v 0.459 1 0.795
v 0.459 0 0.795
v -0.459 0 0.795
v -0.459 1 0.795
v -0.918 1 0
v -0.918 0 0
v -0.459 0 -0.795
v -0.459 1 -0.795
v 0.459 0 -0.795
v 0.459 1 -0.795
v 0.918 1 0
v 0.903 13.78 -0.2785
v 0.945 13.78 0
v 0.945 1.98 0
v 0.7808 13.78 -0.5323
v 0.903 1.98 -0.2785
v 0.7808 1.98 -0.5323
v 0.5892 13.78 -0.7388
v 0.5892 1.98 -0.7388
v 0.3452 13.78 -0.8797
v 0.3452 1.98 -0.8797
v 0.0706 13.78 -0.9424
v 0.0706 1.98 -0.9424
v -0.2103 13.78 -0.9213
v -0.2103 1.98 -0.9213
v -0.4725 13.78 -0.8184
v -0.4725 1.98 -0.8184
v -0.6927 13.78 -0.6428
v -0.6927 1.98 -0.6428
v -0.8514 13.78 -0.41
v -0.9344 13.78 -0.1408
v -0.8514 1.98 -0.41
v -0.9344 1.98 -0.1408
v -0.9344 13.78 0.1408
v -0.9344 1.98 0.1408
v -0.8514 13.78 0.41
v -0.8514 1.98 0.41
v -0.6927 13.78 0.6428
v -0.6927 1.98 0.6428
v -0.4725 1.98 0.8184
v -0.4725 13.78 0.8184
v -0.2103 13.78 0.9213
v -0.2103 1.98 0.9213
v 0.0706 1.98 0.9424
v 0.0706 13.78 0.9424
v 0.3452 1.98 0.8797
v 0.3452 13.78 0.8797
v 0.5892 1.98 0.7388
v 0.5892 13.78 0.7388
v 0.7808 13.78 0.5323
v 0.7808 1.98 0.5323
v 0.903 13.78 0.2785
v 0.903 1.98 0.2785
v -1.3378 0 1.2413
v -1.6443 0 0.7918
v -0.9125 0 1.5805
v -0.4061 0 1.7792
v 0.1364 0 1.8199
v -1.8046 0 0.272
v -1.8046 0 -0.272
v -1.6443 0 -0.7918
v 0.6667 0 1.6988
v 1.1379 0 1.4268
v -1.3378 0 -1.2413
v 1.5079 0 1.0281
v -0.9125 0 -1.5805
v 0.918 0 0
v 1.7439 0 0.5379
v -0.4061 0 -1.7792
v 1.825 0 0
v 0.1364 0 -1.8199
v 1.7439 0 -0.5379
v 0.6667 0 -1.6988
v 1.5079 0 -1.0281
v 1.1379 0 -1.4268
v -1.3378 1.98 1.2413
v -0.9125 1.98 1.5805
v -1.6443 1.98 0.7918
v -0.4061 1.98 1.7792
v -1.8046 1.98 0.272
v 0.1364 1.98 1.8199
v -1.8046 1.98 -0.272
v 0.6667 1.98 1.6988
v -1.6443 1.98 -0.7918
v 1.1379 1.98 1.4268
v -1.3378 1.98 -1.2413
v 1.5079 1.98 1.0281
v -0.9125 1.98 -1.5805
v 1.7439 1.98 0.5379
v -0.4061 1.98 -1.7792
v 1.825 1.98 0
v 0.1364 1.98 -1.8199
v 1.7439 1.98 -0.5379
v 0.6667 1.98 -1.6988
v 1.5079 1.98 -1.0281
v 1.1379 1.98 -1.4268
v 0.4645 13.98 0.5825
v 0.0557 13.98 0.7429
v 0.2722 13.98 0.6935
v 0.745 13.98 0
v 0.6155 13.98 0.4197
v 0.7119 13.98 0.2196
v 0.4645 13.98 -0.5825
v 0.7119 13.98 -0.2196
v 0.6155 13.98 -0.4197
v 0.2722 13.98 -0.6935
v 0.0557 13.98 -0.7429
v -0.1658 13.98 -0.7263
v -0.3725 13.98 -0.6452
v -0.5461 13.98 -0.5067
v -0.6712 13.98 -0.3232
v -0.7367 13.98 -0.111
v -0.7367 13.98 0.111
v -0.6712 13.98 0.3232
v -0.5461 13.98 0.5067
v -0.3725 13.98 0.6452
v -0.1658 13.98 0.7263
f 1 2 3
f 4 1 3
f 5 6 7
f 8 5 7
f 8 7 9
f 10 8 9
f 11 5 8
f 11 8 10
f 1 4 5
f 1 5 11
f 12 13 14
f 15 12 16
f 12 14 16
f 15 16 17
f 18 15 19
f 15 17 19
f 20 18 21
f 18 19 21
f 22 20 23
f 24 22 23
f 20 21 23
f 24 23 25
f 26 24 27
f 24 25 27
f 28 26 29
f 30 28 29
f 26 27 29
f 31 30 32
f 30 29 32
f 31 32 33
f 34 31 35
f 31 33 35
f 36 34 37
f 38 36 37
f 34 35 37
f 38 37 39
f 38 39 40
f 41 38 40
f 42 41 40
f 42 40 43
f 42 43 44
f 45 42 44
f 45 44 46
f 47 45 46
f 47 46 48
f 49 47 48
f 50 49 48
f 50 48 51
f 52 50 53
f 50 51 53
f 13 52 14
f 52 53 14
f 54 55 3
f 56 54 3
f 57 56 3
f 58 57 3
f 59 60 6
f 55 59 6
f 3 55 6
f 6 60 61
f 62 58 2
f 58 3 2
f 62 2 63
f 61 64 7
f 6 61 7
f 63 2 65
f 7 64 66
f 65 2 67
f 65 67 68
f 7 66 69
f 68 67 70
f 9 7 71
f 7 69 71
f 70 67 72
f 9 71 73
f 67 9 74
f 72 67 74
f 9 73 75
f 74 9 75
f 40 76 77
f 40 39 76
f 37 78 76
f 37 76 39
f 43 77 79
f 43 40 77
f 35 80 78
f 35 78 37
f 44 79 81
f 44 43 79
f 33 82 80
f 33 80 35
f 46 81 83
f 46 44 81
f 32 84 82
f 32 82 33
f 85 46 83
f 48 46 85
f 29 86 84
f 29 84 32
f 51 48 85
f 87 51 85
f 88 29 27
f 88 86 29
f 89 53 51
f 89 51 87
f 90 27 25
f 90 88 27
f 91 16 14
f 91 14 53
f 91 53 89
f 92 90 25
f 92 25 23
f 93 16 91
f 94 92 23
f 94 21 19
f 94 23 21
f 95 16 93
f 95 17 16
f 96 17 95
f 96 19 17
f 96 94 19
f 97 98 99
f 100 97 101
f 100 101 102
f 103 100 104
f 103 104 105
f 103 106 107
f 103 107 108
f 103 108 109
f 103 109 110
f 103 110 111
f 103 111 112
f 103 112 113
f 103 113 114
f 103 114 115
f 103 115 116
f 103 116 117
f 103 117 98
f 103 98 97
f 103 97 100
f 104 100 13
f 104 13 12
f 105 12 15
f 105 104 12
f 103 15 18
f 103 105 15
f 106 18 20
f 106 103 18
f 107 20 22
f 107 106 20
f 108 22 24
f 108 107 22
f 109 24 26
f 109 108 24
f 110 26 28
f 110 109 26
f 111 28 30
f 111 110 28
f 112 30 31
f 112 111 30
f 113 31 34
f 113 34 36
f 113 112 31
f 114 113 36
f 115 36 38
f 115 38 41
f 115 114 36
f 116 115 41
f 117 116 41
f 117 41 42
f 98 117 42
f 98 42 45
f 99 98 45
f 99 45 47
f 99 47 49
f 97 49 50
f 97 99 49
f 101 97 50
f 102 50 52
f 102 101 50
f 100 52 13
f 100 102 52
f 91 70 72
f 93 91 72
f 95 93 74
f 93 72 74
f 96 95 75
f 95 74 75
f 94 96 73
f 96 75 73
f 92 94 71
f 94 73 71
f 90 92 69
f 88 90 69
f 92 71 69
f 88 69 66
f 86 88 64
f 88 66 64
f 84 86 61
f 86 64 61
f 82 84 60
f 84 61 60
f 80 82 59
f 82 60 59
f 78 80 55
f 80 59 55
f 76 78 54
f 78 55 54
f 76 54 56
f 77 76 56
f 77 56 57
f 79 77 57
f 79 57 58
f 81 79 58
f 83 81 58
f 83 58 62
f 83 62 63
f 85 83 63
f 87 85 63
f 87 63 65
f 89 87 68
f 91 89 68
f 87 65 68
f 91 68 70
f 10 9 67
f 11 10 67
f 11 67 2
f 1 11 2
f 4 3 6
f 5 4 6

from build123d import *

# Parameters (mm, degrees)
SKETCH1_R           = 1.825
BOSS_EXTRUDE1_DEPTH = 1.98
SKETCH2_R           = 0.945
BOSS_EXTRUDE2_DEPTH = 12
CUT_EXTRUDE1_DEPTH  = 1
CHAMFER1_SIZE       = 0.2


with BuildPart() as part:
    # Sketch1 → Boss-Extrude1 (new body)
    with BuildSketch(Plane(origin=(0, 0, 0), x_dir=(1, 0, 0), z_dir=(0, 1, 0))):
        Circle(SKETCH1_R)
    extrude(amount=BOSS_EXTRUDE1_DEPTH)

    # Sketch2 → Boss-Extrude2 (add)
    with BuildSketch(Plane(origin=(0, 1.98, 0), x_dir=(1, 0, 0), z_dir=(0, 1, 0))):
        Circle(SKETCH2_R)
    extrude(amount=BOSS_EXTRUDE2_DEPTH)

    # Sketch3 → Cut-Extrude1 (cut)
    with BuildSketch(Plane.XZ):
        Polygon((0.458993464, -0.795), (0.917986928, 0), (0.458993464, 0.795), (-0.458993464, 0.795), (-0.917986928, 0), (-0.458993464, -0.795), align=None)
    extrude(amount=-CUT_EXTRUDE1_DEPTH, mode=Mode.SUBTRACT)

    # Chamfer1
    chamfer1_edges = [part.edges().sort_by_distance(p)[0] for p in [
        (-0.945, 13.98, 0),
    ]]
    chamfer(chamfer1_edges, length=CHAMFER1_SIZE)


solid = part.part
